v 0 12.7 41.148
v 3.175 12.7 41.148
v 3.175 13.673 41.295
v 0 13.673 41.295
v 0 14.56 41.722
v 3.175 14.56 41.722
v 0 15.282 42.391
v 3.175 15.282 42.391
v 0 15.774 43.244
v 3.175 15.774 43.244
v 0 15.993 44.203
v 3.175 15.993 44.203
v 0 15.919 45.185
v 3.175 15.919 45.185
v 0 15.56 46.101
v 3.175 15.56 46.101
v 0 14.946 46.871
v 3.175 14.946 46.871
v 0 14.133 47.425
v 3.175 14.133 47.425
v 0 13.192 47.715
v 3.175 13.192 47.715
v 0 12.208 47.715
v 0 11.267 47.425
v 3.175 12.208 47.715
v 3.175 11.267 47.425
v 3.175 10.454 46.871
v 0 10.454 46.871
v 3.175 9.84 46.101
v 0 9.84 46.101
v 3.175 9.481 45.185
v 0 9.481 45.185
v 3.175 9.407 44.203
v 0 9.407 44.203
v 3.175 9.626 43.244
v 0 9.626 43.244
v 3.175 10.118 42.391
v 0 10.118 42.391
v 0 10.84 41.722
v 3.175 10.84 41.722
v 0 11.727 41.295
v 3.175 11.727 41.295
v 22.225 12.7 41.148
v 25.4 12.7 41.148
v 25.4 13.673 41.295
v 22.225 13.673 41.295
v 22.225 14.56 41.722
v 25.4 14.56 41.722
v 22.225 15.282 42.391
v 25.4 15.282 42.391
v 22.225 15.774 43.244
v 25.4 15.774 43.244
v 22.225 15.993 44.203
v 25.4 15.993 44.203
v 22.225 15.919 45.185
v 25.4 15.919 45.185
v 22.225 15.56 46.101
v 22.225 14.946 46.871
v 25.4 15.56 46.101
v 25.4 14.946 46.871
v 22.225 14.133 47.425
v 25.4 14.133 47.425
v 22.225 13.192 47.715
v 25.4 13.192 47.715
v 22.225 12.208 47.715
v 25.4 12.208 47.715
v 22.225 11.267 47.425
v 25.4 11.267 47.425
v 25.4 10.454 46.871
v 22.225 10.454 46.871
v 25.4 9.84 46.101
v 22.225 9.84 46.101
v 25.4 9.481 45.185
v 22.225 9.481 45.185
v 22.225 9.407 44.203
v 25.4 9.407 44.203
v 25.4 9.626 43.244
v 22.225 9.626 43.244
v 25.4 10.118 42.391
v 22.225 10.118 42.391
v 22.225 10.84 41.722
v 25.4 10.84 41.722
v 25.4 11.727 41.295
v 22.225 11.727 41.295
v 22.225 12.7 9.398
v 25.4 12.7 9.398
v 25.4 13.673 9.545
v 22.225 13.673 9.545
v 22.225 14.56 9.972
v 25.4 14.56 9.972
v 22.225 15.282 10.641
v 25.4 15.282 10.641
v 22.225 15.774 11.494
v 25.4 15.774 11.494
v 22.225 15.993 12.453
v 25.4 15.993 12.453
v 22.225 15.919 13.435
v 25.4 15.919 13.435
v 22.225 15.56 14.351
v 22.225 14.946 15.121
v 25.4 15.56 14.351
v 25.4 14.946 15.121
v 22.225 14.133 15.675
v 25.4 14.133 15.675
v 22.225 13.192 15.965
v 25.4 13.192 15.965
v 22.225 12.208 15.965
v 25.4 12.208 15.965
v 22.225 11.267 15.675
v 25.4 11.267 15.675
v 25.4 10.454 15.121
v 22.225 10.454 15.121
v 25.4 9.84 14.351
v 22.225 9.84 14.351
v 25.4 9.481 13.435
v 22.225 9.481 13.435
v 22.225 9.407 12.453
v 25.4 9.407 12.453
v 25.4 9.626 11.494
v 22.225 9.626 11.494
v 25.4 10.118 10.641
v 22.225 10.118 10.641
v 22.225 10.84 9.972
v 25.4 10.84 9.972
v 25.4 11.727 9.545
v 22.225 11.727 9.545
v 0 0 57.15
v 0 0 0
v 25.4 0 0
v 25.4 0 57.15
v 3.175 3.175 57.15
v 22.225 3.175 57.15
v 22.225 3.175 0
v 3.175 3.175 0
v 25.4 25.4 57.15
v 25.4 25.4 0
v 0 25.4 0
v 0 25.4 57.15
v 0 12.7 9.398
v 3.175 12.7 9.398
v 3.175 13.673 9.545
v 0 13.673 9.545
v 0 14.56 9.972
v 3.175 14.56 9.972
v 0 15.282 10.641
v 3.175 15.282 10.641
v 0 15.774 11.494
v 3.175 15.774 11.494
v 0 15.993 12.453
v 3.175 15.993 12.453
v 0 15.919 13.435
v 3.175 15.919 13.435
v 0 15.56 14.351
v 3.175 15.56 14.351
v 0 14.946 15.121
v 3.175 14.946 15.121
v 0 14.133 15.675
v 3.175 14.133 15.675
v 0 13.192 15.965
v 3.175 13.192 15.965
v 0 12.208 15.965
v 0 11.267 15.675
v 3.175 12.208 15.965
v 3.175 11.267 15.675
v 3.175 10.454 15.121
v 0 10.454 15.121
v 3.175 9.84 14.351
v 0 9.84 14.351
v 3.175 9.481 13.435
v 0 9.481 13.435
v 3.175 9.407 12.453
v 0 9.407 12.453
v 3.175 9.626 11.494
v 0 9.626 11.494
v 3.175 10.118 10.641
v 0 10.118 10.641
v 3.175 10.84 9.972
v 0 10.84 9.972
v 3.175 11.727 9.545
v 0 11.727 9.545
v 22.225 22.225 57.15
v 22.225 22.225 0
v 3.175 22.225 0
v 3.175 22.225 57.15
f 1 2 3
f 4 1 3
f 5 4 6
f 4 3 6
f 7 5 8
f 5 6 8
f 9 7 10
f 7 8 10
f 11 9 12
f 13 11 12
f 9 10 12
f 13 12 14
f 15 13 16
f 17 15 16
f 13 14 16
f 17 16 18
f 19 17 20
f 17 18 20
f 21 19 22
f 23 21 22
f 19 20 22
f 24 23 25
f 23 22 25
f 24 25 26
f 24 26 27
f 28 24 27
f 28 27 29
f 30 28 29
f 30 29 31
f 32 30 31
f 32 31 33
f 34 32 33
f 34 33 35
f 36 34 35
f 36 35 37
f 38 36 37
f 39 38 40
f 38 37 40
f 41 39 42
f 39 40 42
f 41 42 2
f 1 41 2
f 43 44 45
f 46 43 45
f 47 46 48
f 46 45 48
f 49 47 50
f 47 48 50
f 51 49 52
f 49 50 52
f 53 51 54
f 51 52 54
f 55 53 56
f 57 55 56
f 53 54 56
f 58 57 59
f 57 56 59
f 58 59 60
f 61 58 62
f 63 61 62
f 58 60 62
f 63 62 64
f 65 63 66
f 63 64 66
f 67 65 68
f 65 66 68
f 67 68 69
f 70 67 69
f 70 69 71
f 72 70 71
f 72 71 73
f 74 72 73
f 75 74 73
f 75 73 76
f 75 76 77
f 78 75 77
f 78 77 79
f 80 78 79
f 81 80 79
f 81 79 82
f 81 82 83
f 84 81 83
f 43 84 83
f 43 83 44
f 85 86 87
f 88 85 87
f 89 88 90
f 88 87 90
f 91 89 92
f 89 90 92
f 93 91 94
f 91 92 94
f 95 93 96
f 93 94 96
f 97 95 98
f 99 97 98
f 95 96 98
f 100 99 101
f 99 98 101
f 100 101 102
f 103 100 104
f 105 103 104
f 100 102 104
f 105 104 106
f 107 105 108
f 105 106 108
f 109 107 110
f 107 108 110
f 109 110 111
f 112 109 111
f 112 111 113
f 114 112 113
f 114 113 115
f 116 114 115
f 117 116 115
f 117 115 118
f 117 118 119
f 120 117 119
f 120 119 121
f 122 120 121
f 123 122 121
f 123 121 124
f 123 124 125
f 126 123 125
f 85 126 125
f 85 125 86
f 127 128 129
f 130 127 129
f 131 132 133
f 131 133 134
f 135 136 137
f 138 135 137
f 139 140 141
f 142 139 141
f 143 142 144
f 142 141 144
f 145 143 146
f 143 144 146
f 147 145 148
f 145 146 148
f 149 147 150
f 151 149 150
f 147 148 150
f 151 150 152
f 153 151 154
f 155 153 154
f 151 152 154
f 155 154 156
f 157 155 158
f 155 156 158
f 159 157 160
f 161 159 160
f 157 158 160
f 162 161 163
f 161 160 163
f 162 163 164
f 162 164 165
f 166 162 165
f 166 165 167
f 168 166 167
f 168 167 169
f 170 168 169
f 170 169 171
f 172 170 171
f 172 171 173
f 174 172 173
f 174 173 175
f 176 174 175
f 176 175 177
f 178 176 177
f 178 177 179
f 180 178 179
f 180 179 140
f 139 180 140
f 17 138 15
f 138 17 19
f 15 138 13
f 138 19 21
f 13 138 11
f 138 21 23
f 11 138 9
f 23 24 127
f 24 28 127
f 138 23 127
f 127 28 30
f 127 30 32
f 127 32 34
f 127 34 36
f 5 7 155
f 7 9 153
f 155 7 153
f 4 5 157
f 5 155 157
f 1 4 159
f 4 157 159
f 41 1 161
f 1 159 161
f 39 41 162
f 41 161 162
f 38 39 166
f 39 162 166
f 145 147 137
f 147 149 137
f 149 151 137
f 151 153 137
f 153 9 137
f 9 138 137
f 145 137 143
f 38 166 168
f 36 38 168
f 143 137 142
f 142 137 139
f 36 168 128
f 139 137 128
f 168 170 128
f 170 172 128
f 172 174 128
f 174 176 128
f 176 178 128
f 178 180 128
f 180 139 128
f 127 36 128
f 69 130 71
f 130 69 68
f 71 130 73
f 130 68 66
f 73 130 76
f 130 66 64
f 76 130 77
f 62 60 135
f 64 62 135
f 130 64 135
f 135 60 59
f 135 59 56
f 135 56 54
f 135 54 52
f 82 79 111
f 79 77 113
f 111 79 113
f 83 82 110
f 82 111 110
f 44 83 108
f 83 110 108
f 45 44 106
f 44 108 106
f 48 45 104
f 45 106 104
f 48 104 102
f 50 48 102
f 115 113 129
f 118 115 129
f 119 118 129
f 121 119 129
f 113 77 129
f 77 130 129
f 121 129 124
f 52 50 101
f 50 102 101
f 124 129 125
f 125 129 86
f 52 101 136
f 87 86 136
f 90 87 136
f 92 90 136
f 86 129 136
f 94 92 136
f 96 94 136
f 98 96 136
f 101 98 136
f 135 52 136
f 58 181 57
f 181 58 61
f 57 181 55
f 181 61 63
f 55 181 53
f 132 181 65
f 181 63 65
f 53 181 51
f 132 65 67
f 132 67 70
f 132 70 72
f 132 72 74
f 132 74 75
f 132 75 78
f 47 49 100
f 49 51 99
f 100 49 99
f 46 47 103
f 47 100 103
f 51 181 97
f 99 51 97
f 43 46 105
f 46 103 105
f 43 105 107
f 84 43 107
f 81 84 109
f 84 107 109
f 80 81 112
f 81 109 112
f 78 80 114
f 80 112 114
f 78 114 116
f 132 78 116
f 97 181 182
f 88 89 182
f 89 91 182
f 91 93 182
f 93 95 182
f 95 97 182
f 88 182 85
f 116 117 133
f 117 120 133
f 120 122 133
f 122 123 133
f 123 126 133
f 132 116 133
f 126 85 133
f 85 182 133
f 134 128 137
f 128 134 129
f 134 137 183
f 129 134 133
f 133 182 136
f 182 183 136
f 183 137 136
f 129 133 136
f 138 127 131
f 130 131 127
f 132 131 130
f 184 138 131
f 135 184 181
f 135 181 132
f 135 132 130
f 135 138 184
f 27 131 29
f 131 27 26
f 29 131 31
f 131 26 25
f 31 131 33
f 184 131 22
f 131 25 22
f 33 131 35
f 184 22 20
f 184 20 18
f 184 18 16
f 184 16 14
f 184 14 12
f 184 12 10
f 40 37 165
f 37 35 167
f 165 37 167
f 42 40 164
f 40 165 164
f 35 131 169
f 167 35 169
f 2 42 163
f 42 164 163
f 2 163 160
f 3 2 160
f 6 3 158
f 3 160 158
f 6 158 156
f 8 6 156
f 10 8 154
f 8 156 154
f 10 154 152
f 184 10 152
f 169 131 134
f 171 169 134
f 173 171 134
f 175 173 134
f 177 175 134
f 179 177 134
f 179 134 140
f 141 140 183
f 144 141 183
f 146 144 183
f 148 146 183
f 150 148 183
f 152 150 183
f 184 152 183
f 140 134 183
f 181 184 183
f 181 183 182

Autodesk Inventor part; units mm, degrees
ref_plane "YZ Plane" through (0, 0, 0) normal (1, 0, 0) x (0, 1, 0)
ref_plane "XZ Plane" through (0, 0, 0) normal (0, 1, 0) x (-1, 0, 0)
ref_plane "XY Plane" through (0, 0, 0) normal (0, 0, 1) x (1, 0, 0)
sketch "Sketch1" plane through (0, 0, 0) normal (0, 0, 1) x (1, 0, 0)
  line L0 (0, 0) -> (25.4, 0)
  line L1 (25.4, 0) -> (25.4, 25.4)
  line L2 (25.4, 25.4) -> (0, 25.4)
  line L3 (0, 25.4) -> (0, 0)
  line L4 (3.175, 22.225) -> (22.225, 22.225)
  line L5 (22.225, 22.225) -> (22.225, 3.175)
  line L6 (22.225, 3.175) -> (3.175, 3.175)
  line L7 (3.175, 3.175) -> (3.175, 22.225)
  dimension "d0" = 25.4
  dimension "d1" = 25.4
  dimension "d2" = 3.175
extrude "Extrusion1" add sketch "Sketch1" along normal blind 57.15
sketch "Sketch2" plane through (25.4, 0, 0) normal (1, 0, 0) x (0, 0, -1)
  line L0 (0, 0) -> (0, 25.4) projected
  line L1 (-57.15, 0) -> (-57.15, 25.4) projected
  circle A0 centre (-12.7, 12.7) radius 3.302
  circle A1 centre (-44.45, 12.7) radius 3.302
  line L2 (-57.15, 12.7) -> (0, 12.7) construction
  dimension "d5" = 31.75
  dimension "d7" = 12.7
  dimension "d8" = 6.604
extrude "Extrusion2" cut sketch "Sketch2" against normal through all
properties part number "Chassis Part 11 (26x28)" material "Aluminum 6061"
